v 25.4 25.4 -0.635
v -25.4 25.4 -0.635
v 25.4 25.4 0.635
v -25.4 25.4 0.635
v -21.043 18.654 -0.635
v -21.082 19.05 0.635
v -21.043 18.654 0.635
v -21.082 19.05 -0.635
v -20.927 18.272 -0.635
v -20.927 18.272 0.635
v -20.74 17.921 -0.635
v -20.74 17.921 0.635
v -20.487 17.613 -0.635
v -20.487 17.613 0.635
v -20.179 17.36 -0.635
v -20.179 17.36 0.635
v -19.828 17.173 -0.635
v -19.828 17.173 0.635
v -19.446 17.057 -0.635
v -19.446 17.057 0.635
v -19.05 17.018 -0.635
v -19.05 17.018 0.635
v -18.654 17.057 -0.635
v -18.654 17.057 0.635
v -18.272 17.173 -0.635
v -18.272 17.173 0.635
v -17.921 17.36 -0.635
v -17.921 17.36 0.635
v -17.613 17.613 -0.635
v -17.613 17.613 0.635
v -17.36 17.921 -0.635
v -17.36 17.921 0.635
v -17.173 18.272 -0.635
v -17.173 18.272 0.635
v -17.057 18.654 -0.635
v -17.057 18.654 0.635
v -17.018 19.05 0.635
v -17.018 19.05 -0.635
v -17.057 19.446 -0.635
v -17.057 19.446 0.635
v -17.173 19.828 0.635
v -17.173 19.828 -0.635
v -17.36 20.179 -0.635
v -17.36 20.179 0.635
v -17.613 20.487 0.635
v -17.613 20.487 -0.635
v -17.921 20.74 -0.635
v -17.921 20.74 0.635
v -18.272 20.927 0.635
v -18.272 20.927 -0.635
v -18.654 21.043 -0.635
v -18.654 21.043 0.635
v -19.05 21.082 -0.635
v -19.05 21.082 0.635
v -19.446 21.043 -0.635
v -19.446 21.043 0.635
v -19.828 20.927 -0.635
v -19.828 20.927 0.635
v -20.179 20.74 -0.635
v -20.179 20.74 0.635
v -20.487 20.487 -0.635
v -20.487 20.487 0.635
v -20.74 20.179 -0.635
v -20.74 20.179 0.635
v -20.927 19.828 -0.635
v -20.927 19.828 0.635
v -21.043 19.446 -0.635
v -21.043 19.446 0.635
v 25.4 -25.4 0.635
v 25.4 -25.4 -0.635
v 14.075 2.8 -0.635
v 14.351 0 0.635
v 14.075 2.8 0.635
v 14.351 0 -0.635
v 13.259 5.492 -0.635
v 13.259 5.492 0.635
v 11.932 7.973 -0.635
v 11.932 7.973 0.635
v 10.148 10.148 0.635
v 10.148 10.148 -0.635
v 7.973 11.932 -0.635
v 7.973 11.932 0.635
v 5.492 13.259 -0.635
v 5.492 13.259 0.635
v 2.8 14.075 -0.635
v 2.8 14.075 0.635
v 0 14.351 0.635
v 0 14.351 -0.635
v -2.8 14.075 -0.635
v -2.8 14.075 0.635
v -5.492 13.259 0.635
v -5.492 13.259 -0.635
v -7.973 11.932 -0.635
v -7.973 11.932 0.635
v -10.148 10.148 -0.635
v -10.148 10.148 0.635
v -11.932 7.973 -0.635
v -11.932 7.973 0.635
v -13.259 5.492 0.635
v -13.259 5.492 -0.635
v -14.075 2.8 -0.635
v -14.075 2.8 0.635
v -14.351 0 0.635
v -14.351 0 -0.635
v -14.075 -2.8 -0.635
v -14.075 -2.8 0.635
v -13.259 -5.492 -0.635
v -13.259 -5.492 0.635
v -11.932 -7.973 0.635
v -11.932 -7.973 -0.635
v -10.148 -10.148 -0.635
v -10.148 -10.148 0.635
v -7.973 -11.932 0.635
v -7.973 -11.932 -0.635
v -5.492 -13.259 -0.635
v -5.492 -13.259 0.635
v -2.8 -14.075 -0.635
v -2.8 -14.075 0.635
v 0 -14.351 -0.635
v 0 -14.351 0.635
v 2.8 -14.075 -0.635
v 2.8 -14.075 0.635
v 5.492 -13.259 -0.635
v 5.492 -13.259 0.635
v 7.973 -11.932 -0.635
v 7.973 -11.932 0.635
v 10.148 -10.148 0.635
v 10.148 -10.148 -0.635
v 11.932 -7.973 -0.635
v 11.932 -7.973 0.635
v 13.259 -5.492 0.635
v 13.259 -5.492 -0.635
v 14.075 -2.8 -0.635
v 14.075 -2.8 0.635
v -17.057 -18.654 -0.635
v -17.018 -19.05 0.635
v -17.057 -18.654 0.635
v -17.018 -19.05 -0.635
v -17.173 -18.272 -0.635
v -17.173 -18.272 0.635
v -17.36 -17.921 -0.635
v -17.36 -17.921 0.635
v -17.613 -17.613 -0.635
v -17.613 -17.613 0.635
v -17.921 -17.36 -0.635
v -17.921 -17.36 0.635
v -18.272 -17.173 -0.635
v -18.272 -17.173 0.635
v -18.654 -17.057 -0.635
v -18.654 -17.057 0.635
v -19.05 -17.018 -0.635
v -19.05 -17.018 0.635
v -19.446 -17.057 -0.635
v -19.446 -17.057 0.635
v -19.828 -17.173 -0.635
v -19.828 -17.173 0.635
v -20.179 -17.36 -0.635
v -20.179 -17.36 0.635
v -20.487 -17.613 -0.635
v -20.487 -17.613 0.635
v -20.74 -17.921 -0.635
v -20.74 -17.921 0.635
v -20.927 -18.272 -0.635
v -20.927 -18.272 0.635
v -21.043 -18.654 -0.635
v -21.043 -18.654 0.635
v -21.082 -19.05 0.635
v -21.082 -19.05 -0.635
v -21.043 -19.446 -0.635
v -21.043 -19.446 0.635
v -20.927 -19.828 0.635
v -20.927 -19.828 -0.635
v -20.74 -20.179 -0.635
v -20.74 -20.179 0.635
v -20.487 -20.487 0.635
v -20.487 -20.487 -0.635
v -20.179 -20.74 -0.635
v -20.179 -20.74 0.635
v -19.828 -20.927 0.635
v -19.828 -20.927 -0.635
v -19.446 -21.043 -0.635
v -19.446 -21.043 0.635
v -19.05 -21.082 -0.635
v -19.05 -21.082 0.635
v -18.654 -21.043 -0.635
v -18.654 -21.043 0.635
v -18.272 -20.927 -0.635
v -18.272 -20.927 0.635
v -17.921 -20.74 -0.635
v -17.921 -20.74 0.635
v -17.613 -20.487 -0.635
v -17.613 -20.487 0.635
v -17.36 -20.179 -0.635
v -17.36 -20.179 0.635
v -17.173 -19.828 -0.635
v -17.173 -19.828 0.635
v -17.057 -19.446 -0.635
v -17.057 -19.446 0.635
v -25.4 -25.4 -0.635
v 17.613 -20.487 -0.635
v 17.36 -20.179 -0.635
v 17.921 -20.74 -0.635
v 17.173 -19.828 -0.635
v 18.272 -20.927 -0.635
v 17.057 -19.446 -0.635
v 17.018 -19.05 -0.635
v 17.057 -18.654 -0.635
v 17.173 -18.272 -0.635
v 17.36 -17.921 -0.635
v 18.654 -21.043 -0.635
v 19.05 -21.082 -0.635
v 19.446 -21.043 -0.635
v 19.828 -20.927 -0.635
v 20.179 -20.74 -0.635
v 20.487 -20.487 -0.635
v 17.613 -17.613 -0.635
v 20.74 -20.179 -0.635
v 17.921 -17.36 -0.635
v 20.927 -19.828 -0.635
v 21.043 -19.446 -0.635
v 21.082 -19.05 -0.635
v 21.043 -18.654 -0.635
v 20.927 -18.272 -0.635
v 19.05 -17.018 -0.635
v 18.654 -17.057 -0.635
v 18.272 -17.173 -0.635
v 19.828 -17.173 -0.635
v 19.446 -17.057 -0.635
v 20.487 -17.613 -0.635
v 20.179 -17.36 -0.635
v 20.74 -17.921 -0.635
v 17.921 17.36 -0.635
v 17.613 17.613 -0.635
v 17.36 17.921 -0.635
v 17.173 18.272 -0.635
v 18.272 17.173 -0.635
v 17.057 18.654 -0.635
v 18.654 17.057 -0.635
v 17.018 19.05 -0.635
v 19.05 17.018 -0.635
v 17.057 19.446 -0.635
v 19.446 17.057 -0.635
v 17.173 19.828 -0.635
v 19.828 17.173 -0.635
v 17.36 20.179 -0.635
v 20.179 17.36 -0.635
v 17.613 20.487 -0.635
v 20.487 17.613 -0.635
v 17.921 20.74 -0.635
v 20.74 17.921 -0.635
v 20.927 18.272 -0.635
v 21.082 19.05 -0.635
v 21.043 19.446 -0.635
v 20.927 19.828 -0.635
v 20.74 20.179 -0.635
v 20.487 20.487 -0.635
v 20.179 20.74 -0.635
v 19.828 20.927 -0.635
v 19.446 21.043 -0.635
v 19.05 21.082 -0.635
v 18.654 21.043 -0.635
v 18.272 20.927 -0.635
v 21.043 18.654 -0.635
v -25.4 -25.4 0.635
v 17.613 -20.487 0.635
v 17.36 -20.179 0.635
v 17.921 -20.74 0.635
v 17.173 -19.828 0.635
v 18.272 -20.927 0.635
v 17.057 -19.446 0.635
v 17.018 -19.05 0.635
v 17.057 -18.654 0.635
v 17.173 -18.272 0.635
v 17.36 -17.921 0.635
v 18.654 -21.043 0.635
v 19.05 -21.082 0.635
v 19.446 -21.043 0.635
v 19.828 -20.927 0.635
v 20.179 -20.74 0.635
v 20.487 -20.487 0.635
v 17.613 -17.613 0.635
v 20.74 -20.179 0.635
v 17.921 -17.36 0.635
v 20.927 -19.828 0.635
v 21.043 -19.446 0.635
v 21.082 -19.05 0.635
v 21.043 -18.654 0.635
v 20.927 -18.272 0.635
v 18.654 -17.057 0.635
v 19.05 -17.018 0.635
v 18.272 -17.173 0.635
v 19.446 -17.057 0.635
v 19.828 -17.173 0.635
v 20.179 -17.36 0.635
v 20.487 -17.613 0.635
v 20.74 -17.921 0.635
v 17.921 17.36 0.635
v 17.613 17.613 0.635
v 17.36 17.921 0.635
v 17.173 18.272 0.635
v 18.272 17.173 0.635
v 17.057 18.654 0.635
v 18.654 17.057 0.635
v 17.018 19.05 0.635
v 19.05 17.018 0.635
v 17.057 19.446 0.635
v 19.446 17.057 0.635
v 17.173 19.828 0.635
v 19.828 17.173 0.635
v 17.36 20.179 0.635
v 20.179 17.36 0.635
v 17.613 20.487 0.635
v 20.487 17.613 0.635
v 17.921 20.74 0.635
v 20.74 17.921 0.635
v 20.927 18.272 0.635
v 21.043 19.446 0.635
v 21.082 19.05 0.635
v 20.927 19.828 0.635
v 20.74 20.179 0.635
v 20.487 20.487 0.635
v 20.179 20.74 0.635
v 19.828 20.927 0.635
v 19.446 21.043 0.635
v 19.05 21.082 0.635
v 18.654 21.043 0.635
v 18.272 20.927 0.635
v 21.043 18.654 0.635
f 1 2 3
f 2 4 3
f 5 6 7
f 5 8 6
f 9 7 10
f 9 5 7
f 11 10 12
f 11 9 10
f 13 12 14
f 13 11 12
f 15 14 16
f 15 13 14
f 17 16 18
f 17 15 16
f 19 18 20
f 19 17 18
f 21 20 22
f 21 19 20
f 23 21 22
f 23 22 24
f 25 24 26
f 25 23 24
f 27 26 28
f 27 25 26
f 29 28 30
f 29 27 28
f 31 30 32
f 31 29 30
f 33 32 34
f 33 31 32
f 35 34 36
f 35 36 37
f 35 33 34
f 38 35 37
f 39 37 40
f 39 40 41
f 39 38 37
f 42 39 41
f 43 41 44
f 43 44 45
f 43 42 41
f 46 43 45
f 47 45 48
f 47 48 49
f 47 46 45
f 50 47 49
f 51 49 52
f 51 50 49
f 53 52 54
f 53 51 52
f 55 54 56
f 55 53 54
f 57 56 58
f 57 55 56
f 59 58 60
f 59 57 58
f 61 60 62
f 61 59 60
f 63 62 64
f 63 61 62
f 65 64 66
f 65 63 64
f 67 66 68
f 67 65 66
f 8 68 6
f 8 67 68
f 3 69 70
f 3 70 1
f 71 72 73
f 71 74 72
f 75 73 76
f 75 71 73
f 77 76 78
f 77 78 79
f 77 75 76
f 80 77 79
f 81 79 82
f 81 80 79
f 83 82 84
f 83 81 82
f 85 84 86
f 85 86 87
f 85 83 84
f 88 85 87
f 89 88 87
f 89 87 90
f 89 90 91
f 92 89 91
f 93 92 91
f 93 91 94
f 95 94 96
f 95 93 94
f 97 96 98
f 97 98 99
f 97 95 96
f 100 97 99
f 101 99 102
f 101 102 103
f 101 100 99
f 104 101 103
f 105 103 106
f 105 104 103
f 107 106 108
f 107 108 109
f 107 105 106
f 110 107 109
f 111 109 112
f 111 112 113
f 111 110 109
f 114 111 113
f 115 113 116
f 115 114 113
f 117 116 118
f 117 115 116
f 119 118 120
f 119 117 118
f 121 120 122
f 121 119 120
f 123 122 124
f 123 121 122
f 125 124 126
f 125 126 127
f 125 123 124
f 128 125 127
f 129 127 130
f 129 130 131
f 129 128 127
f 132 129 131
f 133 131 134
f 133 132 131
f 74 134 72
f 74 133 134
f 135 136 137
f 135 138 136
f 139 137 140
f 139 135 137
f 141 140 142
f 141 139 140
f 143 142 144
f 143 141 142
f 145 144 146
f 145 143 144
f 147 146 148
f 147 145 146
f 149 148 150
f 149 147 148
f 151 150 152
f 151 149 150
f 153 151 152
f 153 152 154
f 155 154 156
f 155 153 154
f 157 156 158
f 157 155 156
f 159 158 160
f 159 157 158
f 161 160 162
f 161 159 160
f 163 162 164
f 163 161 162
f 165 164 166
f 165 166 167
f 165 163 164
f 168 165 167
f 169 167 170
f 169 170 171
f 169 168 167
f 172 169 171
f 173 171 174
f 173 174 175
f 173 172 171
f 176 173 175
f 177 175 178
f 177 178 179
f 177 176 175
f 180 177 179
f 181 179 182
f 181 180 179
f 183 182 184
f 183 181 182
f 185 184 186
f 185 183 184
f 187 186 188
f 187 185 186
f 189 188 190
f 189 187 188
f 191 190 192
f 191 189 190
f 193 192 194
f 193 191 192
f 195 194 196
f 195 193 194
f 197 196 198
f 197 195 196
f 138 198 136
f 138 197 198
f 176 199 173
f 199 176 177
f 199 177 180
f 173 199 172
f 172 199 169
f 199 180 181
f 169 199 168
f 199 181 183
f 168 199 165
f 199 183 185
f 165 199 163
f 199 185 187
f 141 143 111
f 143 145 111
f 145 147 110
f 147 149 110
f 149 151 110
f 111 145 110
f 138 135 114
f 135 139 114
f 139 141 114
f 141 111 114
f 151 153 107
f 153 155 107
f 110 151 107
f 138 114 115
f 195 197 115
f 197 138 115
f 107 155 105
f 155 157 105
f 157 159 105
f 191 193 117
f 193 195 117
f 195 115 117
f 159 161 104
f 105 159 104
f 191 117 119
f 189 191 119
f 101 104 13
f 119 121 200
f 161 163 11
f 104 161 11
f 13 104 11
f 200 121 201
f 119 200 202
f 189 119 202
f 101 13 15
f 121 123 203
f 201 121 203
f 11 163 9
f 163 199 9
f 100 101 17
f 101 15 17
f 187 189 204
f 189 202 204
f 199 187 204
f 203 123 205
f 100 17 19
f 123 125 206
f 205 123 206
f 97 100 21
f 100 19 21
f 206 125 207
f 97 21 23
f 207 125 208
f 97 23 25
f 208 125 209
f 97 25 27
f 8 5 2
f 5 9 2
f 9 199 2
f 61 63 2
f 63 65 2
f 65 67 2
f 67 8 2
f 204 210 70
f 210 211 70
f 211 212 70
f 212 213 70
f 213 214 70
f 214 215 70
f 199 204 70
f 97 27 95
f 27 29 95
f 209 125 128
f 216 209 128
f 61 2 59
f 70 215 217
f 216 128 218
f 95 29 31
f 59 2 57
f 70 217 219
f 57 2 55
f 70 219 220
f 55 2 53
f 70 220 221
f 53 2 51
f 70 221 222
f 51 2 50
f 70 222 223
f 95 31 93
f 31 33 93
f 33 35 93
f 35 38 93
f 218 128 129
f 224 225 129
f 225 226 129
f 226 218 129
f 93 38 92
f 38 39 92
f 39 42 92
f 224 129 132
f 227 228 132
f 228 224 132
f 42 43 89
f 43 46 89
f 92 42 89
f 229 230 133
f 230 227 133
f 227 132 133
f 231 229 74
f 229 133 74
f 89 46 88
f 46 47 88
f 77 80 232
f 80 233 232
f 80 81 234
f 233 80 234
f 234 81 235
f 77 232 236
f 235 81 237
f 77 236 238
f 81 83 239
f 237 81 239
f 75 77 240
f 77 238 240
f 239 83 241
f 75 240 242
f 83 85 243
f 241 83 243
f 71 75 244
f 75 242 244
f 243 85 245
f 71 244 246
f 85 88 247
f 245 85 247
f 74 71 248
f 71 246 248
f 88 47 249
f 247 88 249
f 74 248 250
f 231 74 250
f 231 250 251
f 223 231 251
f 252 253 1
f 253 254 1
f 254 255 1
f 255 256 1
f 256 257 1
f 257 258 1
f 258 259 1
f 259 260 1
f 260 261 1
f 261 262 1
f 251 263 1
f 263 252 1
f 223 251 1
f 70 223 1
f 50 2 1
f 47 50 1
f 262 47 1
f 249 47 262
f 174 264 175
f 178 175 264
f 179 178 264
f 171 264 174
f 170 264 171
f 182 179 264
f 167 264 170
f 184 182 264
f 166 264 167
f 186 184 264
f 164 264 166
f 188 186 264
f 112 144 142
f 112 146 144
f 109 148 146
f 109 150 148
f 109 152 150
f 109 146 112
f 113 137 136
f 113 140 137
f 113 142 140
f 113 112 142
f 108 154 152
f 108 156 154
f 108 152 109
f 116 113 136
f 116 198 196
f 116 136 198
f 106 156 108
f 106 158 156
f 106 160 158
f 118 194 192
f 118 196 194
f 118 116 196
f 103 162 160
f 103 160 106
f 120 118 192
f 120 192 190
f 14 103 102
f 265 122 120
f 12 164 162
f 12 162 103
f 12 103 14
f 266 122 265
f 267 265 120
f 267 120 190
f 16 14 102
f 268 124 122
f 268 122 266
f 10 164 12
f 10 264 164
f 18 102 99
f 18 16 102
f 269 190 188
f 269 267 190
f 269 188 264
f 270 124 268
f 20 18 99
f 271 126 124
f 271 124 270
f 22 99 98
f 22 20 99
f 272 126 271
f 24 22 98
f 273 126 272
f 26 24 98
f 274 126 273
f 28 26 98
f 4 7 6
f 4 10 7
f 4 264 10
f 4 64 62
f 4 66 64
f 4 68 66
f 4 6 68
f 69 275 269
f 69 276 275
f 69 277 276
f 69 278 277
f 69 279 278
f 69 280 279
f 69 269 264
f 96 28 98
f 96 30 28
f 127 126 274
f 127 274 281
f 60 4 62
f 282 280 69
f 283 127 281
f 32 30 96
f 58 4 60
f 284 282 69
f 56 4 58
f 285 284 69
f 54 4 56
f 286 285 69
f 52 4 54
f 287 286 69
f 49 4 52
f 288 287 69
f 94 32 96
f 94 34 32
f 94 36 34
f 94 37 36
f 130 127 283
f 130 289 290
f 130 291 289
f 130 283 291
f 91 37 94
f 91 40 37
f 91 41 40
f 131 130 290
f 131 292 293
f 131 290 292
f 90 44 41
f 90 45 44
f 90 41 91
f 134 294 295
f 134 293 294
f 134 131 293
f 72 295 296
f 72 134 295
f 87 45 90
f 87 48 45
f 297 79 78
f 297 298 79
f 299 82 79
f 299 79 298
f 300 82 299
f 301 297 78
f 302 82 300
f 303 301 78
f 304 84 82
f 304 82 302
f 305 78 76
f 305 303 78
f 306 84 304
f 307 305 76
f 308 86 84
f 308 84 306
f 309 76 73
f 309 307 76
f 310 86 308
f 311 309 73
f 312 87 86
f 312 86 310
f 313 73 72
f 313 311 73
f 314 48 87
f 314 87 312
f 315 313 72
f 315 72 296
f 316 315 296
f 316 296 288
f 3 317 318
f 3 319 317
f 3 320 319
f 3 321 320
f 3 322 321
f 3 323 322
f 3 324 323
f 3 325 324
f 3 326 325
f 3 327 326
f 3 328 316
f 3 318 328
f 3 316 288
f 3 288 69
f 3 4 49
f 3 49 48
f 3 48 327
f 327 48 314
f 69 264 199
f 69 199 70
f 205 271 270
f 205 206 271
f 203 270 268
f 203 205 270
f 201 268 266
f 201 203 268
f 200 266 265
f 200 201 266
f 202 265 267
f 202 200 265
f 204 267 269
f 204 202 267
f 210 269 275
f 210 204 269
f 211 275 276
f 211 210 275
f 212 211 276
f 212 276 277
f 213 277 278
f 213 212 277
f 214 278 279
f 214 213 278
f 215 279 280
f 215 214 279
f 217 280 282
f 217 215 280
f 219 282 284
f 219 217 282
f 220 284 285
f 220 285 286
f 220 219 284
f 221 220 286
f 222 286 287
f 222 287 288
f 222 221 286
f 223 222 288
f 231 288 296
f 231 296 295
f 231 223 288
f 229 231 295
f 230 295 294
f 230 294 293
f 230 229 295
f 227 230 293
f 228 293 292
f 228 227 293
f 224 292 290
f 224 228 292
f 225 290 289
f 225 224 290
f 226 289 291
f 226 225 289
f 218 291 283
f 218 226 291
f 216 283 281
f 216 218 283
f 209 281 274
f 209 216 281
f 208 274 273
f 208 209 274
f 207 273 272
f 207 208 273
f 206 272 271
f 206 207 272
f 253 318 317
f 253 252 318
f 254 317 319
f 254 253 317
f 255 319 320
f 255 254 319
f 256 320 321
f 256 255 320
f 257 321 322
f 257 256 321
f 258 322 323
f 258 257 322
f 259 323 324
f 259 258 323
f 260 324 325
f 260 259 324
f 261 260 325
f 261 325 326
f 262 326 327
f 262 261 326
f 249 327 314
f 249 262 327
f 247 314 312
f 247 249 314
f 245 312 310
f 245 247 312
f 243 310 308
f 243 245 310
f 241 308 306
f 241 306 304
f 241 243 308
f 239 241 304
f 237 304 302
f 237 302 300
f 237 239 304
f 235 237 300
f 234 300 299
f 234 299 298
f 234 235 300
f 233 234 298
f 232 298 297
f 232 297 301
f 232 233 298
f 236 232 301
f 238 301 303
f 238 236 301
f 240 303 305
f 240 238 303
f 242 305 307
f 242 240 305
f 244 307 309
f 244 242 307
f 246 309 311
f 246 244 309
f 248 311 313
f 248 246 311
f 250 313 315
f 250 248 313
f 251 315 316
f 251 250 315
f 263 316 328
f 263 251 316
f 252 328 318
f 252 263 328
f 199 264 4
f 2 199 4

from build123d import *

# Parameters (mm, degrees)
SKETCH1_W           = 50.8
SKETCH1_H           = 50.8
SKETCH1_R           = 14.351
SKETCH1_R_2         = 2.032
BOSS_EXTRUDE1_DEPTH = 0.635


with BuildPart() as part:
    # Sketch1 → Boss-Extrude1 (new, symmetric)
    with BuildSketch(Plane.XY):
        Rectangle(SKETCH1_W, SKETCH1_H)
        Circle(SKETCH1_R, mode=Mode.SUBTRACT)
        with Locations((19.05, 19.05)):
            Circle(SKETCH1_R_2, mode=Mode.SUBTRACT)
        with Locations(Location((-19.05, 19.05, 0), (0, 0, 180))):
            Circle(SKETCH1_R_2, mode=Mode.SUBTRACT)
        with Locations(Location((19.05, -19.05, 0), (0, 0, 180))):
            Circle(SKETCH1_R_2, mode=Mode.SUBTRACT)
        with Locations((-19.05, -19.05)):
            Circle(SKETCH1_R_2, mode=Mode.SUBTRACT)
    extrude(amount=BOSS_EXTRUDE1_DEPTH, both=True)


solid = part.part
